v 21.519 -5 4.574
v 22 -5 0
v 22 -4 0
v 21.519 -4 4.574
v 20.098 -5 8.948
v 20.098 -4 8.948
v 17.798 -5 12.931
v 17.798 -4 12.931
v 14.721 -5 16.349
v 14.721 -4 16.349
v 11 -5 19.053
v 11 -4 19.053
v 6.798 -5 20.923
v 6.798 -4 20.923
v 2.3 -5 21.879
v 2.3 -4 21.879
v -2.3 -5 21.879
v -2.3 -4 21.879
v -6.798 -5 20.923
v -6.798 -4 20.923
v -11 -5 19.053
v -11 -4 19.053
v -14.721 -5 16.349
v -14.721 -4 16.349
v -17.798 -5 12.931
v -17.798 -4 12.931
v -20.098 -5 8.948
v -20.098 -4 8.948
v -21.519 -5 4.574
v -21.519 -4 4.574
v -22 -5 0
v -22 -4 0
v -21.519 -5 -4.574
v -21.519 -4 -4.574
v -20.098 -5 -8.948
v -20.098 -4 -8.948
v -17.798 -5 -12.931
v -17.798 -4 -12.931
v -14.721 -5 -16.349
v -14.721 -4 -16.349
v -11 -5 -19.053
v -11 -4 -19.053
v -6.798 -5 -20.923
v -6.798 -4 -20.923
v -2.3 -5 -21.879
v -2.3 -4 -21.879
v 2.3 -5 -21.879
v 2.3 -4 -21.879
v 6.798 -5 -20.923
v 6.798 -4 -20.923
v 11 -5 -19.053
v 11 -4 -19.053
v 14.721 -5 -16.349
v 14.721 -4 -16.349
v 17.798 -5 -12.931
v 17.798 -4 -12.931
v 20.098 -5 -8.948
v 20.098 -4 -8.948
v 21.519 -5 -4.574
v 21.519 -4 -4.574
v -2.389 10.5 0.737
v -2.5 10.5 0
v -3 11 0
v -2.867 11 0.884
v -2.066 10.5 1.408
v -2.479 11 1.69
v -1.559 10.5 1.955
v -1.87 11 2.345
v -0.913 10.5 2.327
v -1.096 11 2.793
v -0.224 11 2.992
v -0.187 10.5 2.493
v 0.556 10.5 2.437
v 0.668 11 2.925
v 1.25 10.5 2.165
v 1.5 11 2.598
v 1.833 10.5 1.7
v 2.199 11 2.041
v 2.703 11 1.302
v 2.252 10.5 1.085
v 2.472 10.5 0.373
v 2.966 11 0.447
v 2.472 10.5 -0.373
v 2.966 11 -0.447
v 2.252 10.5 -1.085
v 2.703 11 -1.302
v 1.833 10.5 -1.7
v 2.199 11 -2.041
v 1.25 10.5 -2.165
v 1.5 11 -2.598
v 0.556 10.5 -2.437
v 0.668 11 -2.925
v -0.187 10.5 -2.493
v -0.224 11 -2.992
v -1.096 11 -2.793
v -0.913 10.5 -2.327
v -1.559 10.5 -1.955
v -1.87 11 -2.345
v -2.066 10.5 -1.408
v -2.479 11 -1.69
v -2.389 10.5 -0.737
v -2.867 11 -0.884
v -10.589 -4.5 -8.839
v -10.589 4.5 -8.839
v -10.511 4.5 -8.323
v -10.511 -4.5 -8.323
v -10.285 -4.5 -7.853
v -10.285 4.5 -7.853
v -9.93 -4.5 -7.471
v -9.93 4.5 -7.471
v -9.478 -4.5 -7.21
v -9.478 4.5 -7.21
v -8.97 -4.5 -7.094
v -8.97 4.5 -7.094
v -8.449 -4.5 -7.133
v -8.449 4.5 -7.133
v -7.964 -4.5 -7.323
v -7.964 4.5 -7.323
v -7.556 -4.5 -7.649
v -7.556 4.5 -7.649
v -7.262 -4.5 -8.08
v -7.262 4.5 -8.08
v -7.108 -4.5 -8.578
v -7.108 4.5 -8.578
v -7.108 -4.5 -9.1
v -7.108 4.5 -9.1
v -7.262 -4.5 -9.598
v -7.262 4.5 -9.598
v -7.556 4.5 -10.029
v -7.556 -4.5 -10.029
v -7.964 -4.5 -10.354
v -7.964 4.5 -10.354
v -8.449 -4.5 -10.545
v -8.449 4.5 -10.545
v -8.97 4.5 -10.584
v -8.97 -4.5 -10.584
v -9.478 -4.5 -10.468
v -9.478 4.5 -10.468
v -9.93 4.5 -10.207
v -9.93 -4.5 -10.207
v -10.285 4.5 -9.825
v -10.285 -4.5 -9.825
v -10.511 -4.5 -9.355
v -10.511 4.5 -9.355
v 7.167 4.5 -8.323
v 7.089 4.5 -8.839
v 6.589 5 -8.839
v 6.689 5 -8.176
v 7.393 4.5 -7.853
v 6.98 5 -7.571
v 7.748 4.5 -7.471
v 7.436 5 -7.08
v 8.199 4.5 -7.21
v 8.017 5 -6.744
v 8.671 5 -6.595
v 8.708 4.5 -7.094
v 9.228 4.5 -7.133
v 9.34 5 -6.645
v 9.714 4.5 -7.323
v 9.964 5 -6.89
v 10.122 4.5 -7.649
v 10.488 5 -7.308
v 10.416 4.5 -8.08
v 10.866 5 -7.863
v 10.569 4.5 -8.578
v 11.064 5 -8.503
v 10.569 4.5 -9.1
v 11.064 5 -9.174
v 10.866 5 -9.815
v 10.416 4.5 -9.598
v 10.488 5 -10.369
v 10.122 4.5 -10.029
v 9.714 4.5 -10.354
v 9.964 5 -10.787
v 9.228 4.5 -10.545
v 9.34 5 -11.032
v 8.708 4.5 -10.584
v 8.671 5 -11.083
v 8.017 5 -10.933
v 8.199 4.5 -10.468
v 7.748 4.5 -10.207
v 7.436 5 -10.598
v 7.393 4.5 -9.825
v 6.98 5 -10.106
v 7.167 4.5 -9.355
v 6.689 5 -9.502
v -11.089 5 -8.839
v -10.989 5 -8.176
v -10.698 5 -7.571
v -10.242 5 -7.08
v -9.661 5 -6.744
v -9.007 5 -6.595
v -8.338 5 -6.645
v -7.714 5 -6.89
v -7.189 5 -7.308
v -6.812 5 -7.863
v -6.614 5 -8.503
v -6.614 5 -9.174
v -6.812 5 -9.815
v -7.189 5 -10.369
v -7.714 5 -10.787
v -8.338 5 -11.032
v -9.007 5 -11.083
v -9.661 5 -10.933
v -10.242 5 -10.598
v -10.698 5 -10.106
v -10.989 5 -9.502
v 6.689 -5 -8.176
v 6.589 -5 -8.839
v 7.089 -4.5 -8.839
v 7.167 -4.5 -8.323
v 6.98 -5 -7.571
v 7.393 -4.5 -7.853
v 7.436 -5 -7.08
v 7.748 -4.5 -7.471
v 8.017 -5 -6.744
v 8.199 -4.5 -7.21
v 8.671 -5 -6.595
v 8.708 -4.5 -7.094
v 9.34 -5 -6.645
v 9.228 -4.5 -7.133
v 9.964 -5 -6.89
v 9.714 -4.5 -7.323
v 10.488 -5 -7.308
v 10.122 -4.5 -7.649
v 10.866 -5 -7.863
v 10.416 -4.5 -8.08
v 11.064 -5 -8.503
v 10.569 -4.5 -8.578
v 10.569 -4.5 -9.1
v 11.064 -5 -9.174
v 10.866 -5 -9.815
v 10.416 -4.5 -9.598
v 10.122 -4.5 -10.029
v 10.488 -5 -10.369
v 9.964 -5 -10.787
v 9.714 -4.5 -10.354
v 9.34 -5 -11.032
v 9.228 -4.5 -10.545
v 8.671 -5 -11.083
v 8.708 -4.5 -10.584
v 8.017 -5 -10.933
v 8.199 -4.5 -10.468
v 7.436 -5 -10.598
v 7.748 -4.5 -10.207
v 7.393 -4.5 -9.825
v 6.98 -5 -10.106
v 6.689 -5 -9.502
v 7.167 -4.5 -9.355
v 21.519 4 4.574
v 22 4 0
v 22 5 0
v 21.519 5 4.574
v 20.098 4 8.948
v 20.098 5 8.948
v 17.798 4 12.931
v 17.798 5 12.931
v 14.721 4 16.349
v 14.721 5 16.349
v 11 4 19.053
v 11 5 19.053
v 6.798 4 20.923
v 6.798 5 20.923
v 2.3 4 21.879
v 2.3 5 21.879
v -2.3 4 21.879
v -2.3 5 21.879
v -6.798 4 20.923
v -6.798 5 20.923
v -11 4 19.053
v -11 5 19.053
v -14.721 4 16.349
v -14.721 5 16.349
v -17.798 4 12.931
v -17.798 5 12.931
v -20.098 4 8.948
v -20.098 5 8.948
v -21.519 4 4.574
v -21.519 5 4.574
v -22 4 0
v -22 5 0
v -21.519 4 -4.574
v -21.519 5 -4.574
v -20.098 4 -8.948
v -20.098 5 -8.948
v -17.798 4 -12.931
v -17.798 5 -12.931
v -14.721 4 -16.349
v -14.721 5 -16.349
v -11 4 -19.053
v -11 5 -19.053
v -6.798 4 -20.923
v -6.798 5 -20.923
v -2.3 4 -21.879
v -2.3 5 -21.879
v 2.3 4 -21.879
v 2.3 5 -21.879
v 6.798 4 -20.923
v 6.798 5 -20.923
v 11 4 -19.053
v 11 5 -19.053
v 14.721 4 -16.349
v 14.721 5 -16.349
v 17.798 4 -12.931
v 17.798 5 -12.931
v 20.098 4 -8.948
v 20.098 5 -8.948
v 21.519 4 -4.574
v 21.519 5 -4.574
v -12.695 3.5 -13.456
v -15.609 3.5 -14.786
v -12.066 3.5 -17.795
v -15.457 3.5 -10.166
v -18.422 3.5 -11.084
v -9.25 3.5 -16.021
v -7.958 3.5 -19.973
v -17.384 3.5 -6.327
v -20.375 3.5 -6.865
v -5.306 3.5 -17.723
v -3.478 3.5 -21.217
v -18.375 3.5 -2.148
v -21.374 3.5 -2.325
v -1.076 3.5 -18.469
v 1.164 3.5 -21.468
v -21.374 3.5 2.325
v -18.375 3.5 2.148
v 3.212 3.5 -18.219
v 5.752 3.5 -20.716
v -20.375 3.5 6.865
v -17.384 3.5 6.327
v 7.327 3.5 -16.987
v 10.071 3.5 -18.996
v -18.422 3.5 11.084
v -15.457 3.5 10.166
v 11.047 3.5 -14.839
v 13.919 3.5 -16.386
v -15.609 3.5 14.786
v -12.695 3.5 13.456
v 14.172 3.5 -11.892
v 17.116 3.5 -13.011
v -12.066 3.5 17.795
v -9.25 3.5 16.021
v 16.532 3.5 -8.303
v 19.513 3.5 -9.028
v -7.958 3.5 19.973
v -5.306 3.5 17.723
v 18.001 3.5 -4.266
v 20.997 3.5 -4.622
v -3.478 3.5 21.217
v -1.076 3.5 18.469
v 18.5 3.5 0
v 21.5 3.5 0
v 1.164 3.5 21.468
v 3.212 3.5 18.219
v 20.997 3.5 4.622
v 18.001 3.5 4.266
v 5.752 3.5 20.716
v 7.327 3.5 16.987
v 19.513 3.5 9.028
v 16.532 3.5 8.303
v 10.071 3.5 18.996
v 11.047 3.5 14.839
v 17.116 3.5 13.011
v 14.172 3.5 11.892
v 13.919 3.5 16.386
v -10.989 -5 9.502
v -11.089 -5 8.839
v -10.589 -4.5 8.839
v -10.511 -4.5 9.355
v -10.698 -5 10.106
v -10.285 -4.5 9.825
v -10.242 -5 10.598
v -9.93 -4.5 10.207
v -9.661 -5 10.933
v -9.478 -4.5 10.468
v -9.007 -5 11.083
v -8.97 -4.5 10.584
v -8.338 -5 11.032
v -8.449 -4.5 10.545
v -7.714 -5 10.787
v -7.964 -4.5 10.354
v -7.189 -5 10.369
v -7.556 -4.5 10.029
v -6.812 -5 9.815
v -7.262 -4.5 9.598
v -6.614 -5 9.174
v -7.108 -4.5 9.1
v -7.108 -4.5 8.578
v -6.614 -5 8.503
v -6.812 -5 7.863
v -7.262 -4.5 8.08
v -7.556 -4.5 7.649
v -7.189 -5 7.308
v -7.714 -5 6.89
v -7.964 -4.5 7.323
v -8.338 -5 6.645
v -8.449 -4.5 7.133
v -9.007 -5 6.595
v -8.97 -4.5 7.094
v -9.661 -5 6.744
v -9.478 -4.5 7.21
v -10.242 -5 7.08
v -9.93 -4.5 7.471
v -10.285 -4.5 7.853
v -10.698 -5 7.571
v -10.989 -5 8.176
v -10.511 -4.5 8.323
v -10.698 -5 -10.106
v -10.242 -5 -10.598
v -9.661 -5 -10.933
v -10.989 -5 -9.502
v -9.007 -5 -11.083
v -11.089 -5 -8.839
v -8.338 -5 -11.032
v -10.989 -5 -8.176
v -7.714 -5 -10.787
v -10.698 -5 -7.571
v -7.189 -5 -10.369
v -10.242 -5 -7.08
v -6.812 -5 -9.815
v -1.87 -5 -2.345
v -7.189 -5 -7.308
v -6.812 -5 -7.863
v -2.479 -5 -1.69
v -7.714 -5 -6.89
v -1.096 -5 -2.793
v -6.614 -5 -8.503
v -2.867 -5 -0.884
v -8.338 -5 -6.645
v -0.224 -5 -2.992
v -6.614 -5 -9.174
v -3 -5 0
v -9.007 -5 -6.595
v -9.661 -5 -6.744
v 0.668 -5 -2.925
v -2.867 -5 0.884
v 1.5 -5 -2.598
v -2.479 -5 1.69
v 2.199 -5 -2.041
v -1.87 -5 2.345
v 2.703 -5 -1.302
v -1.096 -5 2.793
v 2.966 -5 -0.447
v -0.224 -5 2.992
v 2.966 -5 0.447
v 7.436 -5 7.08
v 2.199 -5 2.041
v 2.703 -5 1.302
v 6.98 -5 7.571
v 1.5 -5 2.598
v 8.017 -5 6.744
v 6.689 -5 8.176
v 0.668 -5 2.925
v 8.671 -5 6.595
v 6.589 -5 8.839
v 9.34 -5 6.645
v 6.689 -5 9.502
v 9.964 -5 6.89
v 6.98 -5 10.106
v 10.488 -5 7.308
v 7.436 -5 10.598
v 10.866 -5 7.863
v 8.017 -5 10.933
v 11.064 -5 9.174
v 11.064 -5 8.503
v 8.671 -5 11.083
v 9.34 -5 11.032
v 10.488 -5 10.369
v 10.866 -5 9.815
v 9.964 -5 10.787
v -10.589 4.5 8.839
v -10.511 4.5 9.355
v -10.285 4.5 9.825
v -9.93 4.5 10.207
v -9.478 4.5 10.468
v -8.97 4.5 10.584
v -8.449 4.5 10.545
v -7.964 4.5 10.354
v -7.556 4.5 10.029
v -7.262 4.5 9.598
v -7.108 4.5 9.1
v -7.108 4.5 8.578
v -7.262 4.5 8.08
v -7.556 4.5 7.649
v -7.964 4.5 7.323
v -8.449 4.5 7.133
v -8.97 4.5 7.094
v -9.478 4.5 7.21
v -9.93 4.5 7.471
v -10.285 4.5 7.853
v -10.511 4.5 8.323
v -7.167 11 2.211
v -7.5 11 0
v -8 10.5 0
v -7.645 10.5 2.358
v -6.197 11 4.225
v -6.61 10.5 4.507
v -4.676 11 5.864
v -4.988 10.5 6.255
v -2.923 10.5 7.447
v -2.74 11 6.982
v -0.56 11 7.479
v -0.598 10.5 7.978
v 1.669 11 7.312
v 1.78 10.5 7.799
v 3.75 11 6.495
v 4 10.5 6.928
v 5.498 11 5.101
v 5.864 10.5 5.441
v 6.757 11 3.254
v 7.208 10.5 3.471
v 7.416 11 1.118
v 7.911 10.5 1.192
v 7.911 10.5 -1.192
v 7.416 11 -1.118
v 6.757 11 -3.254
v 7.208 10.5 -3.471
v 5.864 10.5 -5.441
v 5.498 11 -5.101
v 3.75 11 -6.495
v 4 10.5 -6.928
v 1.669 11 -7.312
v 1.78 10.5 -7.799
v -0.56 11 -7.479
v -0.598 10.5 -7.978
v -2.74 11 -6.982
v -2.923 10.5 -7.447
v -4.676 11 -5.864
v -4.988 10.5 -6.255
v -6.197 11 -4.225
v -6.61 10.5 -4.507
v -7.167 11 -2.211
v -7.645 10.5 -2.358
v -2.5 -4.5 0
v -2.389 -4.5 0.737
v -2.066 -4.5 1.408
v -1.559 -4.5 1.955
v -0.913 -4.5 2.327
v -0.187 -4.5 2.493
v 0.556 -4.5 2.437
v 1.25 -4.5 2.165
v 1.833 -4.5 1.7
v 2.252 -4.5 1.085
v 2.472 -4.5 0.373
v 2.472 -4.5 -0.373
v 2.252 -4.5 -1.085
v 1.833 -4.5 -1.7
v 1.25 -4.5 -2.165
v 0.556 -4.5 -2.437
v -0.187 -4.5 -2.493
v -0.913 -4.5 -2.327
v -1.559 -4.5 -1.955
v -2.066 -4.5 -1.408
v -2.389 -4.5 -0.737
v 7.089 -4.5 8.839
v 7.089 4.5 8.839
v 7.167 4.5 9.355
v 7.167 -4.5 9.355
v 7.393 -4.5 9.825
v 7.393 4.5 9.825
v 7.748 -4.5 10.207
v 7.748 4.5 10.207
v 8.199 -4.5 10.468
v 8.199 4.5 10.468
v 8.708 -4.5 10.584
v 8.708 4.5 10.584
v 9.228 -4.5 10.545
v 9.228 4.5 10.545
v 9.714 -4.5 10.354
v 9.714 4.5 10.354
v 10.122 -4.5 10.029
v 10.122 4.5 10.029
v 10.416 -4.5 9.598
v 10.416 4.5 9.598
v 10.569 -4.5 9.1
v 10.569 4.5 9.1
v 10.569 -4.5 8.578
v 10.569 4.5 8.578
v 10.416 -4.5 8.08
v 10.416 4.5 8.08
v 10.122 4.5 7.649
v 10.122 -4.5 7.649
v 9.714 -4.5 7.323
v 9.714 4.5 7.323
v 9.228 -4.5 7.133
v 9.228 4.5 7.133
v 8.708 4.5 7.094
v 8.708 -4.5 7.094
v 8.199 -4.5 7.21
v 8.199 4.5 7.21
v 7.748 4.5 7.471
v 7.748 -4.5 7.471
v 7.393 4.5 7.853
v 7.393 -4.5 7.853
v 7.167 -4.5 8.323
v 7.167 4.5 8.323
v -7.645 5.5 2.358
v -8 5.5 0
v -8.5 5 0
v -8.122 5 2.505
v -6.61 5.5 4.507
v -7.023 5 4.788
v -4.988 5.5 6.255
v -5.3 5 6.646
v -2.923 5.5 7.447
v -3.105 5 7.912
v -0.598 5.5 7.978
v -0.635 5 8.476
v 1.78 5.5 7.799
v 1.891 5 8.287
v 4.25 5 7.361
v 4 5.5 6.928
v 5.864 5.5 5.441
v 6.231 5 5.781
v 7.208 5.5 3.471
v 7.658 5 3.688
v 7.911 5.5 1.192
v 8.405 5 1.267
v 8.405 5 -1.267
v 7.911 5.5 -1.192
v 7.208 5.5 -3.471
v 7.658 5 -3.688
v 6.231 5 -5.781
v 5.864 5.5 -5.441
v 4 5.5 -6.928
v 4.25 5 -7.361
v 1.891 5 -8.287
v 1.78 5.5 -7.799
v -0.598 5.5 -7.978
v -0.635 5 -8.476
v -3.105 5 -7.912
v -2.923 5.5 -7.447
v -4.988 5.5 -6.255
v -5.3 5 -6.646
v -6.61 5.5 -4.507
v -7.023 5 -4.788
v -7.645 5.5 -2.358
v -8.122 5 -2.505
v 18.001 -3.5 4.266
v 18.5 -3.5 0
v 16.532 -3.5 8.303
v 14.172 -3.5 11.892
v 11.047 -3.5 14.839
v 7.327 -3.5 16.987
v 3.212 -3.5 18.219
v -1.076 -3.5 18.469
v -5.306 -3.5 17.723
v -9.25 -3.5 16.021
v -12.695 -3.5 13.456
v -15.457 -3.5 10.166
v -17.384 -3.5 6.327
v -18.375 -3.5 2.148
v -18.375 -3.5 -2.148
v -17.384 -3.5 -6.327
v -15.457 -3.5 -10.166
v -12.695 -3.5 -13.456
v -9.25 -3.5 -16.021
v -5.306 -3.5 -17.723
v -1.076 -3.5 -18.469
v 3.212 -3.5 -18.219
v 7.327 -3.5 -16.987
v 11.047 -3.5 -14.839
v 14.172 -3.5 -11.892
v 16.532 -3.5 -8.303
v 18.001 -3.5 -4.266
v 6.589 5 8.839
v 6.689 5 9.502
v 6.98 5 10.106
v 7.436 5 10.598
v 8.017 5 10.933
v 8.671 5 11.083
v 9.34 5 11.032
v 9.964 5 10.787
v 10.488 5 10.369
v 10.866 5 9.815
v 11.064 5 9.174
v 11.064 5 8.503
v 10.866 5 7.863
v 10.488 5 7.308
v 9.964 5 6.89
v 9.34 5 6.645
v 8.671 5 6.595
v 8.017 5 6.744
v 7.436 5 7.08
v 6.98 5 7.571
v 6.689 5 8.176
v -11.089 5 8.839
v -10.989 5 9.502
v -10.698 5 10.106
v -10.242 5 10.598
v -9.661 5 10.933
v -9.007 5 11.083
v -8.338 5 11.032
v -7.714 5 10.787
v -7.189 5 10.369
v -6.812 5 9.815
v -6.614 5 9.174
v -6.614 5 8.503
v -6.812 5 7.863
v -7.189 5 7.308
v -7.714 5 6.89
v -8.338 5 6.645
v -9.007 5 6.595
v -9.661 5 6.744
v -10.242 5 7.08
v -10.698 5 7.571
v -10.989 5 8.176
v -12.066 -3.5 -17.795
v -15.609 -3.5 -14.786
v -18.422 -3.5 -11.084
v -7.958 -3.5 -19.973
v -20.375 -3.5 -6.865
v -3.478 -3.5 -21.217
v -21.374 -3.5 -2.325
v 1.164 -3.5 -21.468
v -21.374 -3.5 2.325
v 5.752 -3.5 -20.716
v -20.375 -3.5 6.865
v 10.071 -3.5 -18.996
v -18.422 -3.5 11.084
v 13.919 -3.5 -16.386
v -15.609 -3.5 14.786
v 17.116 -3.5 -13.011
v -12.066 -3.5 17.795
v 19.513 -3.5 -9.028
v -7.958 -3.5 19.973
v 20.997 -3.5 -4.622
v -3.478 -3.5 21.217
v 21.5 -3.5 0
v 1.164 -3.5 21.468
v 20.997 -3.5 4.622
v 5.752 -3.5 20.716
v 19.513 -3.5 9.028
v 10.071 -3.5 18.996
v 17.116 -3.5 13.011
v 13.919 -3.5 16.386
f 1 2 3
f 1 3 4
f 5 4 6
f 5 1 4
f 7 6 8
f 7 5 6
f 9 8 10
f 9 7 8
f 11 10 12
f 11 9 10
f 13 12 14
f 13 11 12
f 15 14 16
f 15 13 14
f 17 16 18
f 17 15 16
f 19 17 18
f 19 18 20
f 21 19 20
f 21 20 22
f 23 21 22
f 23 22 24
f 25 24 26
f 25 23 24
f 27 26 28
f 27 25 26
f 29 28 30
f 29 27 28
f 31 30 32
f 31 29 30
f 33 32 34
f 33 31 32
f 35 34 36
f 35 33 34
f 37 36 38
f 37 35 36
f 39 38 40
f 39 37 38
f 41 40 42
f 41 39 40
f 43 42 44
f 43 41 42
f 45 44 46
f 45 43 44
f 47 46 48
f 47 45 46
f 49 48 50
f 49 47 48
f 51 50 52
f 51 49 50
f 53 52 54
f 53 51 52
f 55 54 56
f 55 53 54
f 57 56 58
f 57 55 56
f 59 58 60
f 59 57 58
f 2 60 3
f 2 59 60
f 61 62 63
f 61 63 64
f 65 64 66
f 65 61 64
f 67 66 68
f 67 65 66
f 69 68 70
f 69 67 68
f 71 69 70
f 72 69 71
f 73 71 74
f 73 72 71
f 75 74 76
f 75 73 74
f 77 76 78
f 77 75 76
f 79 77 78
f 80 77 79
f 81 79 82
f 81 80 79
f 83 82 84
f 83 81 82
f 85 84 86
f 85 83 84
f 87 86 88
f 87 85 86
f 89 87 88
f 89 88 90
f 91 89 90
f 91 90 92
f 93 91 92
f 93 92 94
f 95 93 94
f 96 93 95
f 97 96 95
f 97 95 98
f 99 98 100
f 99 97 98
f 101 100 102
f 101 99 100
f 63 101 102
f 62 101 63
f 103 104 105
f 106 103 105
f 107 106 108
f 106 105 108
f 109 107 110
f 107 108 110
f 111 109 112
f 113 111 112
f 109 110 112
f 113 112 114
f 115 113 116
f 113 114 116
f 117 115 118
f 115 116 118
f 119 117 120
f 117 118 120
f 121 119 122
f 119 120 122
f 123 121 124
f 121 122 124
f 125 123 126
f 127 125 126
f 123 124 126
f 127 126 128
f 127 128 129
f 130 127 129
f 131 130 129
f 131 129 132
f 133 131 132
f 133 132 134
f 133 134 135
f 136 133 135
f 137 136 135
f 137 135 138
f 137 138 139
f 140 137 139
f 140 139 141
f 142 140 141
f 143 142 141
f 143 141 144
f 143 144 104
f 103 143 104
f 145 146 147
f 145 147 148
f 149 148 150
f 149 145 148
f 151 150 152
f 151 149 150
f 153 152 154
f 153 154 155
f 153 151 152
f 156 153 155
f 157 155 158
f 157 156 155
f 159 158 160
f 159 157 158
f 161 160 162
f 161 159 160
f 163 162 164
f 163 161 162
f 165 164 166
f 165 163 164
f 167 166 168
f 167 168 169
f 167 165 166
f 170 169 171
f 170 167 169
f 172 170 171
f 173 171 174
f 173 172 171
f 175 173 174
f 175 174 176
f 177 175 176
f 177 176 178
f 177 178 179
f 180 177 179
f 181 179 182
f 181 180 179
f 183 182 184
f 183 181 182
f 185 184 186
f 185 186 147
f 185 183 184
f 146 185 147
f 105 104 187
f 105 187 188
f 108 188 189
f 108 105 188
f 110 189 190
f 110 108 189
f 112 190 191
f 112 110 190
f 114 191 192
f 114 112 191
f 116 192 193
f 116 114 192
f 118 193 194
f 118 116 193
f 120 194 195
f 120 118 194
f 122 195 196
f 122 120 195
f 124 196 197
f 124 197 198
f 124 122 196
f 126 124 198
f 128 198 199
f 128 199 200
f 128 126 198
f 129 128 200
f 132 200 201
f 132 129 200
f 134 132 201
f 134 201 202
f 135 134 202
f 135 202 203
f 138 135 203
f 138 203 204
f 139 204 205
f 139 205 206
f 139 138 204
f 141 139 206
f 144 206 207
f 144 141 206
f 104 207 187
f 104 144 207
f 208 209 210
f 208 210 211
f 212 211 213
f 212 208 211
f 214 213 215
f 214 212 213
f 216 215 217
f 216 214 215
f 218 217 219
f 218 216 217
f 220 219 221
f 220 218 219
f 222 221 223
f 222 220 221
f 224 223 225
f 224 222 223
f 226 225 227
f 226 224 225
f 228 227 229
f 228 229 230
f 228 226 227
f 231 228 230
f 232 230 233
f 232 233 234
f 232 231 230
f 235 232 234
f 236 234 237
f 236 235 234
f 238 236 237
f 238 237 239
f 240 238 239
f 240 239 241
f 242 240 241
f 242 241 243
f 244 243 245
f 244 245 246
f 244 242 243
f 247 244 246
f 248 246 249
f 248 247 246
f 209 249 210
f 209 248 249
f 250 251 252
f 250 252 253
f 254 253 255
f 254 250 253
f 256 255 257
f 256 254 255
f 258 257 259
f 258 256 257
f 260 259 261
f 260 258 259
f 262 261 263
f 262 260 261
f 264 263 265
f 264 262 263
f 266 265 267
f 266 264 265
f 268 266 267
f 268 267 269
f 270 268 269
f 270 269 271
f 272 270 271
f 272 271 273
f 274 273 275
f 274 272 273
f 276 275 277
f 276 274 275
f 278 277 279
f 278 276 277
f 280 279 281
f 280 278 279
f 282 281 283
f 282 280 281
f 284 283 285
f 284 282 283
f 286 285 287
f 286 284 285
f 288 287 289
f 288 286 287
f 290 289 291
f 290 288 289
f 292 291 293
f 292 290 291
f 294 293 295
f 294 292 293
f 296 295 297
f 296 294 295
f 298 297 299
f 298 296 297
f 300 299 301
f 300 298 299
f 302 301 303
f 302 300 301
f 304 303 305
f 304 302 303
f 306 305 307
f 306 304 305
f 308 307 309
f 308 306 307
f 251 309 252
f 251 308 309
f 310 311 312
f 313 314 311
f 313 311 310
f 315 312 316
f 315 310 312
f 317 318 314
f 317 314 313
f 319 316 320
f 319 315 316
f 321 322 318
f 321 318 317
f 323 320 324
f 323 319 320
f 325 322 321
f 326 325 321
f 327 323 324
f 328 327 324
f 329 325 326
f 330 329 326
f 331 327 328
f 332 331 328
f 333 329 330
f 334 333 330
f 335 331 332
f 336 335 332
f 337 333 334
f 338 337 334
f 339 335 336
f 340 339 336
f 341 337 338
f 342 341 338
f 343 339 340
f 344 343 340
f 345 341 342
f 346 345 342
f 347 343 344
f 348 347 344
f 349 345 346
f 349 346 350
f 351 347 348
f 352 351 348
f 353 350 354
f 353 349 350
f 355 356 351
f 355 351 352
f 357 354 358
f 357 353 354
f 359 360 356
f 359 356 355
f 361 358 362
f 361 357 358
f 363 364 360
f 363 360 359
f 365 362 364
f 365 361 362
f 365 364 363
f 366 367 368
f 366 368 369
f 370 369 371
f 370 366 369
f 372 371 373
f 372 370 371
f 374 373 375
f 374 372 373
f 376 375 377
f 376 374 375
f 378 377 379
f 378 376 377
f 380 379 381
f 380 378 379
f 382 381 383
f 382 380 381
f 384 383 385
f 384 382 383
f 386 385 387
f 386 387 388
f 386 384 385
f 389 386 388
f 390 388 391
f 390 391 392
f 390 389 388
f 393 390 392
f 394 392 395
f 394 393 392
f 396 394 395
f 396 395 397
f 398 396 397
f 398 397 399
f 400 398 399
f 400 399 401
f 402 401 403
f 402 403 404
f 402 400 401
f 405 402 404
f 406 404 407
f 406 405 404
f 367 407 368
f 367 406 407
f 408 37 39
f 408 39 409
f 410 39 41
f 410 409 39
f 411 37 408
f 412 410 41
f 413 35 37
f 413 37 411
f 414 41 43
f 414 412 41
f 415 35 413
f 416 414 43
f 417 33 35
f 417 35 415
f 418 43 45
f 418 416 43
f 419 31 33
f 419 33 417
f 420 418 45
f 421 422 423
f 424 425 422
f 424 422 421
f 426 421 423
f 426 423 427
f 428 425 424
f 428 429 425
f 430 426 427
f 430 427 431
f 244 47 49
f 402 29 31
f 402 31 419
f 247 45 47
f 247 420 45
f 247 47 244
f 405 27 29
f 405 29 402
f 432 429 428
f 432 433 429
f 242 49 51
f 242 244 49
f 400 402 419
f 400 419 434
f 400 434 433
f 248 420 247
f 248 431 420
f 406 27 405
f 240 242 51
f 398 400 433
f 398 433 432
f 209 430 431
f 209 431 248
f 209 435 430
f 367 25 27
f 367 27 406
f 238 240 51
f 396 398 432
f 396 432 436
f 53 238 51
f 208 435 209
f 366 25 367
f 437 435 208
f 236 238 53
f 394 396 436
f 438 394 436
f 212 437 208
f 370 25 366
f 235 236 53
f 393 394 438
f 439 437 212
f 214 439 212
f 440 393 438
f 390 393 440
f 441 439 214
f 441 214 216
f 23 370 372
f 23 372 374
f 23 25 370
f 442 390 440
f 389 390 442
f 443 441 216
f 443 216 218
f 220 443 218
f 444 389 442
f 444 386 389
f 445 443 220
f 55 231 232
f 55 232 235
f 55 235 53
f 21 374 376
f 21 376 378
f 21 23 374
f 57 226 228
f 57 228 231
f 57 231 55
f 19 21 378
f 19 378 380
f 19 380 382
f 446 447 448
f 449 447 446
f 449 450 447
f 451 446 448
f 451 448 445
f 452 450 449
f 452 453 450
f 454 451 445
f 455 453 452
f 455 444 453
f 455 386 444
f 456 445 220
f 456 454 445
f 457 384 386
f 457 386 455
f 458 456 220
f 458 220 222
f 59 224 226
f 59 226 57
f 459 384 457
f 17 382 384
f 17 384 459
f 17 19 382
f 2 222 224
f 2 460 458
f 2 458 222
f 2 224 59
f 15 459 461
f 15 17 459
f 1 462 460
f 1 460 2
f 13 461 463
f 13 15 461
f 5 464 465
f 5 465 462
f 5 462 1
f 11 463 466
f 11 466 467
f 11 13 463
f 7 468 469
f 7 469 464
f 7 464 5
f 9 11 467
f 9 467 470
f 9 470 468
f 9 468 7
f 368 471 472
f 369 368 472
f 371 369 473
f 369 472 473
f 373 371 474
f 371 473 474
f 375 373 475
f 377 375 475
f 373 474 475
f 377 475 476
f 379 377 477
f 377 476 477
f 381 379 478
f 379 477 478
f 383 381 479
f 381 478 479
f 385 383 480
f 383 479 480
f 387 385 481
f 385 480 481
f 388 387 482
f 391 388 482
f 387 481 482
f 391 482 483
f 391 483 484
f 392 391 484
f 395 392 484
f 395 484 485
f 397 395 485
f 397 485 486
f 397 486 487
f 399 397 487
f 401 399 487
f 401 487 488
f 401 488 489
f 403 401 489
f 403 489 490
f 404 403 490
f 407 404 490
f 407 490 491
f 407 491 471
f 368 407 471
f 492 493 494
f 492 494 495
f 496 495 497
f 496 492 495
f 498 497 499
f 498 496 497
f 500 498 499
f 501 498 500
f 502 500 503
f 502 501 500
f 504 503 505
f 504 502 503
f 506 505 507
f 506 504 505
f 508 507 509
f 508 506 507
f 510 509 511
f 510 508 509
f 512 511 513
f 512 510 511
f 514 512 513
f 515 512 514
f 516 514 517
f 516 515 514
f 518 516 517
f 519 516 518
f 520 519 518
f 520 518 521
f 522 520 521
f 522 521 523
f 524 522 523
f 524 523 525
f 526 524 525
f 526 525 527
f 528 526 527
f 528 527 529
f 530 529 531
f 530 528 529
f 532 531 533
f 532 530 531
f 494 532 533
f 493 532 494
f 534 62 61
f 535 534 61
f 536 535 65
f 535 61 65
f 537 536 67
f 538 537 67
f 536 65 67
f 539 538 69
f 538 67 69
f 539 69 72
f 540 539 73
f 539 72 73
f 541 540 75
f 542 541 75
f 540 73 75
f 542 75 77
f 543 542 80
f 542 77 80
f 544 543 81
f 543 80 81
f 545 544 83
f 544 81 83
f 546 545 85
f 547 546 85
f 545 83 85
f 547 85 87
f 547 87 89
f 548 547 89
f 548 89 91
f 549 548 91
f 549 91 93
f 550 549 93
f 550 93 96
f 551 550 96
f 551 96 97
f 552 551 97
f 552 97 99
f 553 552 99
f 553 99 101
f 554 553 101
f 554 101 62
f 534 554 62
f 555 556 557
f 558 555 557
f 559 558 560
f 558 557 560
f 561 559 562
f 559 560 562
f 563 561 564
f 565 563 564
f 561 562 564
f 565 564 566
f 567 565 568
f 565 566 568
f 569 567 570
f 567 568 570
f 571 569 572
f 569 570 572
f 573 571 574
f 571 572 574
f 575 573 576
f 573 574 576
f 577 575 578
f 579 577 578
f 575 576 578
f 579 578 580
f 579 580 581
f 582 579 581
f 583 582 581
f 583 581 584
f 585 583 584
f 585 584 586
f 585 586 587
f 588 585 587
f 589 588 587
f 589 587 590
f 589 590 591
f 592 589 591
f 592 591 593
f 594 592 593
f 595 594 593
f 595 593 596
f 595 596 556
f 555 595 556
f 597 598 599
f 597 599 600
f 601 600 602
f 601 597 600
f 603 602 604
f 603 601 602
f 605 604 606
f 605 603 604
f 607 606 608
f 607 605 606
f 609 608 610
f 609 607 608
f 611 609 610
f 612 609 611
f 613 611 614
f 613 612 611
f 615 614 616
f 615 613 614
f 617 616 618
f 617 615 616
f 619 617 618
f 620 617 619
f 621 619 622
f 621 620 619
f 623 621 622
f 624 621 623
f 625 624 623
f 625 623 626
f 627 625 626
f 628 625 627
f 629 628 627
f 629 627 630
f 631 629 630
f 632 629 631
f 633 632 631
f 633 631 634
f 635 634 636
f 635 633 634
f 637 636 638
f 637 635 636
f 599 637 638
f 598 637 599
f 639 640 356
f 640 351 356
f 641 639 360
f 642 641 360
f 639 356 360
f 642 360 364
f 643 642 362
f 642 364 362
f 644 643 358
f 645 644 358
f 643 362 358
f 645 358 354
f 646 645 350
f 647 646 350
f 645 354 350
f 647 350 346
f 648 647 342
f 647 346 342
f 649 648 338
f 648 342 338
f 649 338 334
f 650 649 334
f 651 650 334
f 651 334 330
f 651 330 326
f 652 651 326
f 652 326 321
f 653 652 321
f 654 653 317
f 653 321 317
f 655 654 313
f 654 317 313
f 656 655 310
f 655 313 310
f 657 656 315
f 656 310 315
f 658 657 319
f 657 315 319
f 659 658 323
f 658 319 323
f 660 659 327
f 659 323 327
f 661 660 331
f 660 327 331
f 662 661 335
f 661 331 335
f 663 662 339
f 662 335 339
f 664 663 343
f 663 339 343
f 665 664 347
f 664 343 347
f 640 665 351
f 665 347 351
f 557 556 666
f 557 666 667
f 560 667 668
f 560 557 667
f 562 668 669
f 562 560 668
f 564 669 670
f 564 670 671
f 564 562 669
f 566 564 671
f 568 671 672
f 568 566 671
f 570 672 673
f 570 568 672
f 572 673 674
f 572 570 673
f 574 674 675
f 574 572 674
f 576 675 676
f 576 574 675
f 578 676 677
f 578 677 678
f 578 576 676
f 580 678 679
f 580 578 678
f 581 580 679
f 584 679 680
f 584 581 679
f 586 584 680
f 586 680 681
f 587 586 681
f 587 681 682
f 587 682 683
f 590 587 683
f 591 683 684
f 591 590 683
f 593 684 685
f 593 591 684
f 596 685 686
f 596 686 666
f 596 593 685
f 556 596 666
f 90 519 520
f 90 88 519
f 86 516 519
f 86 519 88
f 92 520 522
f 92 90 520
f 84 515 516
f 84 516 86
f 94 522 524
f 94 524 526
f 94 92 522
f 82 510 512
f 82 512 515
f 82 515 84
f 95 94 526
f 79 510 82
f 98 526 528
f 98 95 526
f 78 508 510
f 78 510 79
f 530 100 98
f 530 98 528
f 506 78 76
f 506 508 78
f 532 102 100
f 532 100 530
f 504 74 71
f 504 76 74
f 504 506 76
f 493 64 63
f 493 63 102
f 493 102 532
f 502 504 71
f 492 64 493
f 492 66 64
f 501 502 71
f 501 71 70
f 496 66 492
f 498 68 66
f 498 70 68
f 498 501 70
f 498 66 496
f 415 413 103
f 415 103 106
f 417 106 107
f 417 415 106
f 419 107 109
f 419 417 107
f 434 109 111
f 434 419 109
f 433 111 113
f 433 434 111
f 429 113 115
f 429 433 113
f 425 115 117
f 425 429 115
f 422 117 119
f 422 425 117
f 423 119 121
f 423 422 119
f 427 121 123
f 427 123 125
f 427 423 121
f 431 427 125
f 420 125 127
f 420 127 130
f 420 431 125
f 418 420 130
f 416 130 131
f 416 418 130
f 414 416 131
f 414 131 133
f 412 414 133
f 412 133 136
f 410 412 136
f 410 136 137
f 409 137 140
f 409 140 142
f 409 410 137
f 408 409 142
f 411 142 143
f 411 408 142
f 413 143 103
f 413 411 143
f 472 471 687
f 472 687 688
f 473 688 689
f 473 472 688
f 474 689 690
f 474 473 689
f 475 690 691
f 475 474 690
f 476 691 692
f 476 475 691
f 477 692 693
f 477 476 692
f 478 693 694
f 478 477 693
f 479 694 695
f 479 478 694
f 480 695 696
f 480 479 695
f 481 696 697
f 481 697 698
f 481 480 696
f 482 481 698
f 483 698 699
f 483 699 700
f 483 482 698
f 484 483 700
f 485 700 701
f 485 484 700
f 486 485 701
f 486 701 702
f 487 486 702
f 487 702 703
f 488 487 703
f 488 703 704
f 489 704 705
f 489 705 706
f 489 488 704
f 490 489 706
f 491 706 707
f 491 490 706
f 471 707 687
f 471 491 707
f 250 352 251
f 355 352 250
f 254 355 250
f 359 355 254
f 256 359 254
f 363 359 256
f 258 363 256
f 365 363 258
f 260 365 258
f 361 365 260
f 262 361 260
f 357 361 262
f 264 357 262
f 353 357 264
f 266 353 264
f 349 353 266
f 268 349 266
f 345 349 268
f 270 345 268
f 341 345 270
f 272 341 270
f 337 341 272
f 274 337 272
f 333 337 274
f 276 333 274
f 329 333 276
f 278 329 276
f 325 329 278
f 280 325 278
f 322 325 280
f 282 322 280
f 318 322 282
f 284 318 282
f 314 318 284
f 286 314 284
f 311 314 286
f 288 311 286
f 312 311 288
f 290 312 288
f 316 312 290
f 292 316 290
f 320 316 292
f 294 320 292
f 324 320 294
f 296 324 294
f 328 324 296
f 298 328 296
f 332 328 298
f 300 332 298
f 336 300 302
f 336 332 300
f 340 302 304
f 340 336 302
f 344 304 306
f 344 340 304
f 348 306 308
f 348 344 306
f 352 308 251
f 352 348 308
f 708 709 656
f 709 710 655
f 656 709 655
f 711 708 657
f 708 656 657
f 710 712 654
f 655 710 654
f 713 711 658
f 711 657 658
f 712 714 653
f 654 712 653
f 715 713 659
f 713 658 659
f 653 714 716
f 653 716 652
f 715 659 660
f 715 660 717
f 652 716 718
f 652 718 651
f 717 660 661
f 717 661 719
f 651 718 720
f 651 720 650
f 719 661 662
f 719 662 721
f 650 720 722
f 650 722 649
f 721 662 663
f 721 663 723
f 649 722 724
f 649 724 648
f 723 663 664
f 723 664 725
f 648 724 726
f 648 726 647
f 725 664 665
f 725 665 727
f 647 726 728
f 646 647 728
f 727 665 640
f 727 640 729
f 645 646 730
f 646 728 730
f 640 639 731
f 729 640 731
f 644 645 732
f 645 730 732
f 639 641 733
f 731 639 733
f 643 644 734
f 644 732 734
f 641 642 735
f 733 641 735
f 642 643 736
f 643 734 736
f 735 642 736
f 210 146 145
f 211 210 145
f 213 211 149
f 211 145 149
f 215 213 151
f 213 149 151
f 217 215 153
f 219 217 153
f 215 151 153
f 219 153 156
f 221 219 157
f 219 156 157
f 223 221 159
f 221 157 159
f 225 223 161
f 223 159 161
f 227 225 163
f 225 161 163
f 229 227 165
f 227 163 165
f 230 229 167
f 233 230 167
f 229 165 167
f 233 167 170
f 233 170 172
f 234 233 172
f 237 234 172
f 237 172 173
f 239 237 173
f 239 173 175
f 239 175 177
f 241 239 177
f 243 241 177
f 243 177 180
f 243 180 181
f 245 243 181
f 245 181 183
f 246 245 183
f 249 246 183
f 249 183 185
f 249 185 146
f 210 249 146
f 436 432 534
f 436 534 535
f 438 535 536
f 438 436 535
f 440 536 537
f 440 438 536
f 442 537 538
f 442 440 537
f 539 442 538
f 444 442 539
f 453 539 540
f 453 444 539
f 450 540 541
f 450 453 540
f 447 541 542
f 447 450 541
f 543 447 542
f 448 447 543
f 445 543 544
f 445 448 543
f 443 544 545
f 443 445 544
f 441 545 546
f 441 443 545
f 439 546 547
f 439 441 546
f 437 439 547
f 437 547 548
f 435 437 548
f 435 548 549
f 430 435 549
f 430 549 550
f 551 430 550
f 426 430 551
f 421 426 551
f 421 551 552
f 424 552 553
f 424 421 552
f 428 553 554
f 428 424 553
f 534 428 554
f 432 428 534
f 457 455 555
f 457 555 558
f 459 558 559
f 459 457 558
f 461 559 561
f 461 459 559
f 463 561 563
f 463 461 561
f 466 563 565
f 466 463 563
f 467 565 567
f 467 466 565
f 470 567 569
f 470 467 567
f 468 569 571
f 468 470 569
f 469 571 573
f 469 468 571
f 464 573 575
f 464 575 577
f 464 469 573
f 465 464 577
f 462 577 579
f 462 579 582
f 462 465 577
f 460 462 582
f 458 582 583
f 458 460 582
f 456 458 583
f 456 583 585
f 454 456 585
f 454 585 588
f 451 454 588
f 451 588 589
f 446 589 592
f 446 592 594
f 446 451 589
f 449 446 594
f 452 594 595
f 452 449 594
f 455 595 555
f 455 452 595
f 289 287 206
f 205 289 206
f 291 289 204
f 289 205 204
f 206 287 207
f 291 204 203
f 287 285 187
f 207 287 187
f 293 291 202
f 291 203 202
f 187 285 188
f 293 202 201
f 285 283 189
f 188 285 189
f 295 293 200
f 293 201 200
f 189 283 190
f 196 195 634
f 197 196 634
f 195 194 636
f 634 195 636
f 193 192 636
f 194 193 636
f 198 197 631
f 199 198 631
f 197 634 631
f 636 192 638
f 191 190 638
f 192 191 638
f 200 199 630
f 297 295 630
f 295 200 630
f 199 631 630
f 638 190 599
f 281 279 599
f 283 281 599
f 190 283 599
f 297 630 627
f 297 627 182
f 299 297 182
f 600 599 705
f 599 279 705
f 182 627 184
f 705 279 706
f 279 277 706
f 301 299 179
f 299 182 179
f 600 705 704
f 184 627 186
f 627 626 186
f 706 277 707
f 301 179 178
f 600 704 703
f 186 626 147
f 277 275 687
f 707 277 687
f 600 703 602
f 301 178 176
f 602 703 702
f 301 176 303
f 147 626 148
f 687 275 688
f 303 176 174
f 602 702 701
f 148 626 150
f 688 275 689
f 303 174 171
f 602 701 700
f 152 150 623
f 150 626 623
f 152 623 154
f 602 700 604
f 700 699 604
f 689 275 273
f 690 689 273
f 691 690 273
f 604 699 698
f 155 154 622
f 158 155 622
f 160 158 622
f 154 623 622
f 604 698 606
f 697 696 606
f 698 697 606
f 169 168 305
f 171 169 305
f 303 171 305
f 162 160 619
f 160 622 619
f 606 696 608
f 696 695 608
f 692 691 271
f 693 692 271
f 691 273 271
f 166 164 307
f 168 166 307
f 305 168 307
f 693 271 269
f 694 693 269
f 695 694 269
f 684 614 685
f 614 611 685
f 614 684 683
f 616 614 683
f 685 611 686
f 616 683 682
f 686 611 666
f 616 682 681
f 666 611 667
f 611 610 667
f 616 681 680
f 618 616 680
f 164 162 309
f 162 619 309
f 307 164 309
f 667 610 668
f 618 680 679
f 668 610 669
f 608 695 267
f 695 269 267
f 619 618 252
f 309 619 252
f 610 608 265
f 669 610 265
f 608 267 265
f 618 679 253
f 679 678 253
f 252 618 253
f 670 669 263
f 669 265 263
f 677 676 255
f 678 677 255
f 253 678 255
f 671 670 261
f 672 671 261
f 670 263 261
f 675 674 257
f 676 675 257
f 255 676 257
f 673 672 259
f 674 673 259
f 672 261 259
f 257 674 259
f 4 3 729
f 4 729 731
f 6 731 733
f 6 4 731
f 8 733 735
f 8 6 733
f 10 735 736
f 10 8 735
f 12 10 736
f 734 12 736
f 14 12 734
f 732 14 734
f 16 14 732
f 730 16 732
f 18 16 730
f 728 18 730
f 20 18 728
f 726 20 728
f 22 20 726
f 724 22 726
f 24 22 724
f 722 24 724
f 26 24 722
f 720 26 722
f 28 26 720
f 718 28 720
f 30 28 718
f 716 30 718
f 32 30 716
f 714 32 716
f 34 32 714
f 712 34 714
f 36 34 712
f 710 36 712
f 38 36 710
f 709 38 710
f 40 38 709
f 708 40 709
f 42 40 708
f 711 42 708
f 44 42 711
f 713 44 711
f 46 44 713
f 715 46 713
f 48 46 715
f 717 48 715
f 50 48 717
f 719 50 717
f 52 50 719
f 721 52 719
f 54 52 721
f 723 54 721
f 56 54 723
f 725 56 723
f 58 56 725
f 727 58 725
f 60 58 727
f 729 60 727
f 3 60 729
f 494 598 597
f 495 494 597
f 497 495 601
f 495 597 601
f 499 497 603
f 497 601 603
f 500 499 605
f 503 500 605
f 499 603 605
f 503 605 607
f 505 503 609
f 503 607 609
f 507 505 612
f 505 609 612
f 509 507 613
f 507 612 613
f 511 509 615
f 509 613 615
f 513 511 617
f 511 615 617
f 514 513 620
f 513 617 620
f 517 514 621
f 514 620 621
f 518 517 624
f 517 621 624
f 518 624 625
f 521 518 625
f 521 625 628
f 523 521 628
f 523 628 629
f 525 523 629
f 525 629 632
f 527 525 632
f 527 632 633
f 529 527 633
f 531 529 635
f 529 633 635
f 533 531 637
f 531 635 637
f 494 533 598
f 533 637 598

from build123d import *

# Parameters (mm, degrees)
F0_R      = 22
F1_DEPTH  = 5
F2_R      = 30.4296764291
F2_R_2    = 18.5
F3_DEPTH  = 3.5
F4_R      = 8
F5_DEPTH  = 6
F6_R      = 2.5
F7_DEPTH  = 16.001
F8_SIZE   = 0.5
F9_R      = 1.75
F10_DEPTH = 10.001
F11_SIZE  = 0.5


with BuildPart() as f1:
    # F0 (on Front) → F1 (new body, symmetric)
    with BuildSketch(Plane.XZ):
        Circle(F0_R)
    extrude(amount=F1_DEPTH, both=True)

    # F2 (on Front) → F3 (cut, symmetric)
    with BuildSketch(Plane.XZ):
        Circle(F2_R)
        Circle(F2_R_2, mode=Mode.SUBTRACT)
    extrude(amount=F3_DEPTH, both=True, mode=Mode.SUBTRACT)

    # F4 (on face) → F5 (join)
    with BuildSketch(Plane(origin=(0, 5, 0), x_dir=(-1, 0, 0), z_dir=(0, 1, 0))):
        Circle(F4_R)
    extrude(amount=F5_DEPTH)

    # F6 (on face) → F7 (cut, through all)
    with BuildSketch(Plane(origin=(0, 11, 0), x_dir=(-1, 0, 0), z_dir=(0, 1, 0))):
        Circle(F6_R)
    extrude(amount=-F7_DEPTH, mode=Mode.SUBTRACT)

    # F8
    f8_edges = [f1.edges().sort_by_distance(p)[0] for p in [
        (8, 11, 0),
        (2.5, 11, 0),
        (8, 5, 0),
        (-22, 3.5, 0),
        (-22, -3.5, 0),
        (2.5, -5, 0),
    ]]
    chamfer(f8_edges, length=F8_SIZE)

    # F9 (on face) → F10 (cut, through all)
    with BuildSketch(Plane(origin=(0, 5, 0), x_dir=(-1, 0, 0), z_dir=(0, 1, 0))):
        with Locations((-8.8388347648, 8.8388347648)):
            Circle(F9_R)
        with Locations((-8.8388347648, -8.8388347648)):
            Circle(F9_R)
        with Locations((8.8388347648, -8.8388347648)):
            Circle(F9_R)
        with Locations((8.8388347648, 8.8388347648)):
            Circle(F9_R)
    extrude(amount=-F10_DEPTH, mode=Mode.SUBTRACT)

    # F11
    f11_edges = [f1.edges().sort_by_distance(p)[0] for p in [
        (-7.088835, -5, 8.838835),
        (-7.088835, -5, -8.838835),
        (10.588835, -5, -8.838835),
        (10.588835, -5, 8.838835),
        (10.588835, 5, 8.838835),
        (-7.088835, 5, 8.838835),
        (-7.088835, 5, -8.838835),
        (10.588835, 5, -8.838835),
    ]]
    chamfer(f11_edges, length=F11_SIZE)


solid = f1.part
